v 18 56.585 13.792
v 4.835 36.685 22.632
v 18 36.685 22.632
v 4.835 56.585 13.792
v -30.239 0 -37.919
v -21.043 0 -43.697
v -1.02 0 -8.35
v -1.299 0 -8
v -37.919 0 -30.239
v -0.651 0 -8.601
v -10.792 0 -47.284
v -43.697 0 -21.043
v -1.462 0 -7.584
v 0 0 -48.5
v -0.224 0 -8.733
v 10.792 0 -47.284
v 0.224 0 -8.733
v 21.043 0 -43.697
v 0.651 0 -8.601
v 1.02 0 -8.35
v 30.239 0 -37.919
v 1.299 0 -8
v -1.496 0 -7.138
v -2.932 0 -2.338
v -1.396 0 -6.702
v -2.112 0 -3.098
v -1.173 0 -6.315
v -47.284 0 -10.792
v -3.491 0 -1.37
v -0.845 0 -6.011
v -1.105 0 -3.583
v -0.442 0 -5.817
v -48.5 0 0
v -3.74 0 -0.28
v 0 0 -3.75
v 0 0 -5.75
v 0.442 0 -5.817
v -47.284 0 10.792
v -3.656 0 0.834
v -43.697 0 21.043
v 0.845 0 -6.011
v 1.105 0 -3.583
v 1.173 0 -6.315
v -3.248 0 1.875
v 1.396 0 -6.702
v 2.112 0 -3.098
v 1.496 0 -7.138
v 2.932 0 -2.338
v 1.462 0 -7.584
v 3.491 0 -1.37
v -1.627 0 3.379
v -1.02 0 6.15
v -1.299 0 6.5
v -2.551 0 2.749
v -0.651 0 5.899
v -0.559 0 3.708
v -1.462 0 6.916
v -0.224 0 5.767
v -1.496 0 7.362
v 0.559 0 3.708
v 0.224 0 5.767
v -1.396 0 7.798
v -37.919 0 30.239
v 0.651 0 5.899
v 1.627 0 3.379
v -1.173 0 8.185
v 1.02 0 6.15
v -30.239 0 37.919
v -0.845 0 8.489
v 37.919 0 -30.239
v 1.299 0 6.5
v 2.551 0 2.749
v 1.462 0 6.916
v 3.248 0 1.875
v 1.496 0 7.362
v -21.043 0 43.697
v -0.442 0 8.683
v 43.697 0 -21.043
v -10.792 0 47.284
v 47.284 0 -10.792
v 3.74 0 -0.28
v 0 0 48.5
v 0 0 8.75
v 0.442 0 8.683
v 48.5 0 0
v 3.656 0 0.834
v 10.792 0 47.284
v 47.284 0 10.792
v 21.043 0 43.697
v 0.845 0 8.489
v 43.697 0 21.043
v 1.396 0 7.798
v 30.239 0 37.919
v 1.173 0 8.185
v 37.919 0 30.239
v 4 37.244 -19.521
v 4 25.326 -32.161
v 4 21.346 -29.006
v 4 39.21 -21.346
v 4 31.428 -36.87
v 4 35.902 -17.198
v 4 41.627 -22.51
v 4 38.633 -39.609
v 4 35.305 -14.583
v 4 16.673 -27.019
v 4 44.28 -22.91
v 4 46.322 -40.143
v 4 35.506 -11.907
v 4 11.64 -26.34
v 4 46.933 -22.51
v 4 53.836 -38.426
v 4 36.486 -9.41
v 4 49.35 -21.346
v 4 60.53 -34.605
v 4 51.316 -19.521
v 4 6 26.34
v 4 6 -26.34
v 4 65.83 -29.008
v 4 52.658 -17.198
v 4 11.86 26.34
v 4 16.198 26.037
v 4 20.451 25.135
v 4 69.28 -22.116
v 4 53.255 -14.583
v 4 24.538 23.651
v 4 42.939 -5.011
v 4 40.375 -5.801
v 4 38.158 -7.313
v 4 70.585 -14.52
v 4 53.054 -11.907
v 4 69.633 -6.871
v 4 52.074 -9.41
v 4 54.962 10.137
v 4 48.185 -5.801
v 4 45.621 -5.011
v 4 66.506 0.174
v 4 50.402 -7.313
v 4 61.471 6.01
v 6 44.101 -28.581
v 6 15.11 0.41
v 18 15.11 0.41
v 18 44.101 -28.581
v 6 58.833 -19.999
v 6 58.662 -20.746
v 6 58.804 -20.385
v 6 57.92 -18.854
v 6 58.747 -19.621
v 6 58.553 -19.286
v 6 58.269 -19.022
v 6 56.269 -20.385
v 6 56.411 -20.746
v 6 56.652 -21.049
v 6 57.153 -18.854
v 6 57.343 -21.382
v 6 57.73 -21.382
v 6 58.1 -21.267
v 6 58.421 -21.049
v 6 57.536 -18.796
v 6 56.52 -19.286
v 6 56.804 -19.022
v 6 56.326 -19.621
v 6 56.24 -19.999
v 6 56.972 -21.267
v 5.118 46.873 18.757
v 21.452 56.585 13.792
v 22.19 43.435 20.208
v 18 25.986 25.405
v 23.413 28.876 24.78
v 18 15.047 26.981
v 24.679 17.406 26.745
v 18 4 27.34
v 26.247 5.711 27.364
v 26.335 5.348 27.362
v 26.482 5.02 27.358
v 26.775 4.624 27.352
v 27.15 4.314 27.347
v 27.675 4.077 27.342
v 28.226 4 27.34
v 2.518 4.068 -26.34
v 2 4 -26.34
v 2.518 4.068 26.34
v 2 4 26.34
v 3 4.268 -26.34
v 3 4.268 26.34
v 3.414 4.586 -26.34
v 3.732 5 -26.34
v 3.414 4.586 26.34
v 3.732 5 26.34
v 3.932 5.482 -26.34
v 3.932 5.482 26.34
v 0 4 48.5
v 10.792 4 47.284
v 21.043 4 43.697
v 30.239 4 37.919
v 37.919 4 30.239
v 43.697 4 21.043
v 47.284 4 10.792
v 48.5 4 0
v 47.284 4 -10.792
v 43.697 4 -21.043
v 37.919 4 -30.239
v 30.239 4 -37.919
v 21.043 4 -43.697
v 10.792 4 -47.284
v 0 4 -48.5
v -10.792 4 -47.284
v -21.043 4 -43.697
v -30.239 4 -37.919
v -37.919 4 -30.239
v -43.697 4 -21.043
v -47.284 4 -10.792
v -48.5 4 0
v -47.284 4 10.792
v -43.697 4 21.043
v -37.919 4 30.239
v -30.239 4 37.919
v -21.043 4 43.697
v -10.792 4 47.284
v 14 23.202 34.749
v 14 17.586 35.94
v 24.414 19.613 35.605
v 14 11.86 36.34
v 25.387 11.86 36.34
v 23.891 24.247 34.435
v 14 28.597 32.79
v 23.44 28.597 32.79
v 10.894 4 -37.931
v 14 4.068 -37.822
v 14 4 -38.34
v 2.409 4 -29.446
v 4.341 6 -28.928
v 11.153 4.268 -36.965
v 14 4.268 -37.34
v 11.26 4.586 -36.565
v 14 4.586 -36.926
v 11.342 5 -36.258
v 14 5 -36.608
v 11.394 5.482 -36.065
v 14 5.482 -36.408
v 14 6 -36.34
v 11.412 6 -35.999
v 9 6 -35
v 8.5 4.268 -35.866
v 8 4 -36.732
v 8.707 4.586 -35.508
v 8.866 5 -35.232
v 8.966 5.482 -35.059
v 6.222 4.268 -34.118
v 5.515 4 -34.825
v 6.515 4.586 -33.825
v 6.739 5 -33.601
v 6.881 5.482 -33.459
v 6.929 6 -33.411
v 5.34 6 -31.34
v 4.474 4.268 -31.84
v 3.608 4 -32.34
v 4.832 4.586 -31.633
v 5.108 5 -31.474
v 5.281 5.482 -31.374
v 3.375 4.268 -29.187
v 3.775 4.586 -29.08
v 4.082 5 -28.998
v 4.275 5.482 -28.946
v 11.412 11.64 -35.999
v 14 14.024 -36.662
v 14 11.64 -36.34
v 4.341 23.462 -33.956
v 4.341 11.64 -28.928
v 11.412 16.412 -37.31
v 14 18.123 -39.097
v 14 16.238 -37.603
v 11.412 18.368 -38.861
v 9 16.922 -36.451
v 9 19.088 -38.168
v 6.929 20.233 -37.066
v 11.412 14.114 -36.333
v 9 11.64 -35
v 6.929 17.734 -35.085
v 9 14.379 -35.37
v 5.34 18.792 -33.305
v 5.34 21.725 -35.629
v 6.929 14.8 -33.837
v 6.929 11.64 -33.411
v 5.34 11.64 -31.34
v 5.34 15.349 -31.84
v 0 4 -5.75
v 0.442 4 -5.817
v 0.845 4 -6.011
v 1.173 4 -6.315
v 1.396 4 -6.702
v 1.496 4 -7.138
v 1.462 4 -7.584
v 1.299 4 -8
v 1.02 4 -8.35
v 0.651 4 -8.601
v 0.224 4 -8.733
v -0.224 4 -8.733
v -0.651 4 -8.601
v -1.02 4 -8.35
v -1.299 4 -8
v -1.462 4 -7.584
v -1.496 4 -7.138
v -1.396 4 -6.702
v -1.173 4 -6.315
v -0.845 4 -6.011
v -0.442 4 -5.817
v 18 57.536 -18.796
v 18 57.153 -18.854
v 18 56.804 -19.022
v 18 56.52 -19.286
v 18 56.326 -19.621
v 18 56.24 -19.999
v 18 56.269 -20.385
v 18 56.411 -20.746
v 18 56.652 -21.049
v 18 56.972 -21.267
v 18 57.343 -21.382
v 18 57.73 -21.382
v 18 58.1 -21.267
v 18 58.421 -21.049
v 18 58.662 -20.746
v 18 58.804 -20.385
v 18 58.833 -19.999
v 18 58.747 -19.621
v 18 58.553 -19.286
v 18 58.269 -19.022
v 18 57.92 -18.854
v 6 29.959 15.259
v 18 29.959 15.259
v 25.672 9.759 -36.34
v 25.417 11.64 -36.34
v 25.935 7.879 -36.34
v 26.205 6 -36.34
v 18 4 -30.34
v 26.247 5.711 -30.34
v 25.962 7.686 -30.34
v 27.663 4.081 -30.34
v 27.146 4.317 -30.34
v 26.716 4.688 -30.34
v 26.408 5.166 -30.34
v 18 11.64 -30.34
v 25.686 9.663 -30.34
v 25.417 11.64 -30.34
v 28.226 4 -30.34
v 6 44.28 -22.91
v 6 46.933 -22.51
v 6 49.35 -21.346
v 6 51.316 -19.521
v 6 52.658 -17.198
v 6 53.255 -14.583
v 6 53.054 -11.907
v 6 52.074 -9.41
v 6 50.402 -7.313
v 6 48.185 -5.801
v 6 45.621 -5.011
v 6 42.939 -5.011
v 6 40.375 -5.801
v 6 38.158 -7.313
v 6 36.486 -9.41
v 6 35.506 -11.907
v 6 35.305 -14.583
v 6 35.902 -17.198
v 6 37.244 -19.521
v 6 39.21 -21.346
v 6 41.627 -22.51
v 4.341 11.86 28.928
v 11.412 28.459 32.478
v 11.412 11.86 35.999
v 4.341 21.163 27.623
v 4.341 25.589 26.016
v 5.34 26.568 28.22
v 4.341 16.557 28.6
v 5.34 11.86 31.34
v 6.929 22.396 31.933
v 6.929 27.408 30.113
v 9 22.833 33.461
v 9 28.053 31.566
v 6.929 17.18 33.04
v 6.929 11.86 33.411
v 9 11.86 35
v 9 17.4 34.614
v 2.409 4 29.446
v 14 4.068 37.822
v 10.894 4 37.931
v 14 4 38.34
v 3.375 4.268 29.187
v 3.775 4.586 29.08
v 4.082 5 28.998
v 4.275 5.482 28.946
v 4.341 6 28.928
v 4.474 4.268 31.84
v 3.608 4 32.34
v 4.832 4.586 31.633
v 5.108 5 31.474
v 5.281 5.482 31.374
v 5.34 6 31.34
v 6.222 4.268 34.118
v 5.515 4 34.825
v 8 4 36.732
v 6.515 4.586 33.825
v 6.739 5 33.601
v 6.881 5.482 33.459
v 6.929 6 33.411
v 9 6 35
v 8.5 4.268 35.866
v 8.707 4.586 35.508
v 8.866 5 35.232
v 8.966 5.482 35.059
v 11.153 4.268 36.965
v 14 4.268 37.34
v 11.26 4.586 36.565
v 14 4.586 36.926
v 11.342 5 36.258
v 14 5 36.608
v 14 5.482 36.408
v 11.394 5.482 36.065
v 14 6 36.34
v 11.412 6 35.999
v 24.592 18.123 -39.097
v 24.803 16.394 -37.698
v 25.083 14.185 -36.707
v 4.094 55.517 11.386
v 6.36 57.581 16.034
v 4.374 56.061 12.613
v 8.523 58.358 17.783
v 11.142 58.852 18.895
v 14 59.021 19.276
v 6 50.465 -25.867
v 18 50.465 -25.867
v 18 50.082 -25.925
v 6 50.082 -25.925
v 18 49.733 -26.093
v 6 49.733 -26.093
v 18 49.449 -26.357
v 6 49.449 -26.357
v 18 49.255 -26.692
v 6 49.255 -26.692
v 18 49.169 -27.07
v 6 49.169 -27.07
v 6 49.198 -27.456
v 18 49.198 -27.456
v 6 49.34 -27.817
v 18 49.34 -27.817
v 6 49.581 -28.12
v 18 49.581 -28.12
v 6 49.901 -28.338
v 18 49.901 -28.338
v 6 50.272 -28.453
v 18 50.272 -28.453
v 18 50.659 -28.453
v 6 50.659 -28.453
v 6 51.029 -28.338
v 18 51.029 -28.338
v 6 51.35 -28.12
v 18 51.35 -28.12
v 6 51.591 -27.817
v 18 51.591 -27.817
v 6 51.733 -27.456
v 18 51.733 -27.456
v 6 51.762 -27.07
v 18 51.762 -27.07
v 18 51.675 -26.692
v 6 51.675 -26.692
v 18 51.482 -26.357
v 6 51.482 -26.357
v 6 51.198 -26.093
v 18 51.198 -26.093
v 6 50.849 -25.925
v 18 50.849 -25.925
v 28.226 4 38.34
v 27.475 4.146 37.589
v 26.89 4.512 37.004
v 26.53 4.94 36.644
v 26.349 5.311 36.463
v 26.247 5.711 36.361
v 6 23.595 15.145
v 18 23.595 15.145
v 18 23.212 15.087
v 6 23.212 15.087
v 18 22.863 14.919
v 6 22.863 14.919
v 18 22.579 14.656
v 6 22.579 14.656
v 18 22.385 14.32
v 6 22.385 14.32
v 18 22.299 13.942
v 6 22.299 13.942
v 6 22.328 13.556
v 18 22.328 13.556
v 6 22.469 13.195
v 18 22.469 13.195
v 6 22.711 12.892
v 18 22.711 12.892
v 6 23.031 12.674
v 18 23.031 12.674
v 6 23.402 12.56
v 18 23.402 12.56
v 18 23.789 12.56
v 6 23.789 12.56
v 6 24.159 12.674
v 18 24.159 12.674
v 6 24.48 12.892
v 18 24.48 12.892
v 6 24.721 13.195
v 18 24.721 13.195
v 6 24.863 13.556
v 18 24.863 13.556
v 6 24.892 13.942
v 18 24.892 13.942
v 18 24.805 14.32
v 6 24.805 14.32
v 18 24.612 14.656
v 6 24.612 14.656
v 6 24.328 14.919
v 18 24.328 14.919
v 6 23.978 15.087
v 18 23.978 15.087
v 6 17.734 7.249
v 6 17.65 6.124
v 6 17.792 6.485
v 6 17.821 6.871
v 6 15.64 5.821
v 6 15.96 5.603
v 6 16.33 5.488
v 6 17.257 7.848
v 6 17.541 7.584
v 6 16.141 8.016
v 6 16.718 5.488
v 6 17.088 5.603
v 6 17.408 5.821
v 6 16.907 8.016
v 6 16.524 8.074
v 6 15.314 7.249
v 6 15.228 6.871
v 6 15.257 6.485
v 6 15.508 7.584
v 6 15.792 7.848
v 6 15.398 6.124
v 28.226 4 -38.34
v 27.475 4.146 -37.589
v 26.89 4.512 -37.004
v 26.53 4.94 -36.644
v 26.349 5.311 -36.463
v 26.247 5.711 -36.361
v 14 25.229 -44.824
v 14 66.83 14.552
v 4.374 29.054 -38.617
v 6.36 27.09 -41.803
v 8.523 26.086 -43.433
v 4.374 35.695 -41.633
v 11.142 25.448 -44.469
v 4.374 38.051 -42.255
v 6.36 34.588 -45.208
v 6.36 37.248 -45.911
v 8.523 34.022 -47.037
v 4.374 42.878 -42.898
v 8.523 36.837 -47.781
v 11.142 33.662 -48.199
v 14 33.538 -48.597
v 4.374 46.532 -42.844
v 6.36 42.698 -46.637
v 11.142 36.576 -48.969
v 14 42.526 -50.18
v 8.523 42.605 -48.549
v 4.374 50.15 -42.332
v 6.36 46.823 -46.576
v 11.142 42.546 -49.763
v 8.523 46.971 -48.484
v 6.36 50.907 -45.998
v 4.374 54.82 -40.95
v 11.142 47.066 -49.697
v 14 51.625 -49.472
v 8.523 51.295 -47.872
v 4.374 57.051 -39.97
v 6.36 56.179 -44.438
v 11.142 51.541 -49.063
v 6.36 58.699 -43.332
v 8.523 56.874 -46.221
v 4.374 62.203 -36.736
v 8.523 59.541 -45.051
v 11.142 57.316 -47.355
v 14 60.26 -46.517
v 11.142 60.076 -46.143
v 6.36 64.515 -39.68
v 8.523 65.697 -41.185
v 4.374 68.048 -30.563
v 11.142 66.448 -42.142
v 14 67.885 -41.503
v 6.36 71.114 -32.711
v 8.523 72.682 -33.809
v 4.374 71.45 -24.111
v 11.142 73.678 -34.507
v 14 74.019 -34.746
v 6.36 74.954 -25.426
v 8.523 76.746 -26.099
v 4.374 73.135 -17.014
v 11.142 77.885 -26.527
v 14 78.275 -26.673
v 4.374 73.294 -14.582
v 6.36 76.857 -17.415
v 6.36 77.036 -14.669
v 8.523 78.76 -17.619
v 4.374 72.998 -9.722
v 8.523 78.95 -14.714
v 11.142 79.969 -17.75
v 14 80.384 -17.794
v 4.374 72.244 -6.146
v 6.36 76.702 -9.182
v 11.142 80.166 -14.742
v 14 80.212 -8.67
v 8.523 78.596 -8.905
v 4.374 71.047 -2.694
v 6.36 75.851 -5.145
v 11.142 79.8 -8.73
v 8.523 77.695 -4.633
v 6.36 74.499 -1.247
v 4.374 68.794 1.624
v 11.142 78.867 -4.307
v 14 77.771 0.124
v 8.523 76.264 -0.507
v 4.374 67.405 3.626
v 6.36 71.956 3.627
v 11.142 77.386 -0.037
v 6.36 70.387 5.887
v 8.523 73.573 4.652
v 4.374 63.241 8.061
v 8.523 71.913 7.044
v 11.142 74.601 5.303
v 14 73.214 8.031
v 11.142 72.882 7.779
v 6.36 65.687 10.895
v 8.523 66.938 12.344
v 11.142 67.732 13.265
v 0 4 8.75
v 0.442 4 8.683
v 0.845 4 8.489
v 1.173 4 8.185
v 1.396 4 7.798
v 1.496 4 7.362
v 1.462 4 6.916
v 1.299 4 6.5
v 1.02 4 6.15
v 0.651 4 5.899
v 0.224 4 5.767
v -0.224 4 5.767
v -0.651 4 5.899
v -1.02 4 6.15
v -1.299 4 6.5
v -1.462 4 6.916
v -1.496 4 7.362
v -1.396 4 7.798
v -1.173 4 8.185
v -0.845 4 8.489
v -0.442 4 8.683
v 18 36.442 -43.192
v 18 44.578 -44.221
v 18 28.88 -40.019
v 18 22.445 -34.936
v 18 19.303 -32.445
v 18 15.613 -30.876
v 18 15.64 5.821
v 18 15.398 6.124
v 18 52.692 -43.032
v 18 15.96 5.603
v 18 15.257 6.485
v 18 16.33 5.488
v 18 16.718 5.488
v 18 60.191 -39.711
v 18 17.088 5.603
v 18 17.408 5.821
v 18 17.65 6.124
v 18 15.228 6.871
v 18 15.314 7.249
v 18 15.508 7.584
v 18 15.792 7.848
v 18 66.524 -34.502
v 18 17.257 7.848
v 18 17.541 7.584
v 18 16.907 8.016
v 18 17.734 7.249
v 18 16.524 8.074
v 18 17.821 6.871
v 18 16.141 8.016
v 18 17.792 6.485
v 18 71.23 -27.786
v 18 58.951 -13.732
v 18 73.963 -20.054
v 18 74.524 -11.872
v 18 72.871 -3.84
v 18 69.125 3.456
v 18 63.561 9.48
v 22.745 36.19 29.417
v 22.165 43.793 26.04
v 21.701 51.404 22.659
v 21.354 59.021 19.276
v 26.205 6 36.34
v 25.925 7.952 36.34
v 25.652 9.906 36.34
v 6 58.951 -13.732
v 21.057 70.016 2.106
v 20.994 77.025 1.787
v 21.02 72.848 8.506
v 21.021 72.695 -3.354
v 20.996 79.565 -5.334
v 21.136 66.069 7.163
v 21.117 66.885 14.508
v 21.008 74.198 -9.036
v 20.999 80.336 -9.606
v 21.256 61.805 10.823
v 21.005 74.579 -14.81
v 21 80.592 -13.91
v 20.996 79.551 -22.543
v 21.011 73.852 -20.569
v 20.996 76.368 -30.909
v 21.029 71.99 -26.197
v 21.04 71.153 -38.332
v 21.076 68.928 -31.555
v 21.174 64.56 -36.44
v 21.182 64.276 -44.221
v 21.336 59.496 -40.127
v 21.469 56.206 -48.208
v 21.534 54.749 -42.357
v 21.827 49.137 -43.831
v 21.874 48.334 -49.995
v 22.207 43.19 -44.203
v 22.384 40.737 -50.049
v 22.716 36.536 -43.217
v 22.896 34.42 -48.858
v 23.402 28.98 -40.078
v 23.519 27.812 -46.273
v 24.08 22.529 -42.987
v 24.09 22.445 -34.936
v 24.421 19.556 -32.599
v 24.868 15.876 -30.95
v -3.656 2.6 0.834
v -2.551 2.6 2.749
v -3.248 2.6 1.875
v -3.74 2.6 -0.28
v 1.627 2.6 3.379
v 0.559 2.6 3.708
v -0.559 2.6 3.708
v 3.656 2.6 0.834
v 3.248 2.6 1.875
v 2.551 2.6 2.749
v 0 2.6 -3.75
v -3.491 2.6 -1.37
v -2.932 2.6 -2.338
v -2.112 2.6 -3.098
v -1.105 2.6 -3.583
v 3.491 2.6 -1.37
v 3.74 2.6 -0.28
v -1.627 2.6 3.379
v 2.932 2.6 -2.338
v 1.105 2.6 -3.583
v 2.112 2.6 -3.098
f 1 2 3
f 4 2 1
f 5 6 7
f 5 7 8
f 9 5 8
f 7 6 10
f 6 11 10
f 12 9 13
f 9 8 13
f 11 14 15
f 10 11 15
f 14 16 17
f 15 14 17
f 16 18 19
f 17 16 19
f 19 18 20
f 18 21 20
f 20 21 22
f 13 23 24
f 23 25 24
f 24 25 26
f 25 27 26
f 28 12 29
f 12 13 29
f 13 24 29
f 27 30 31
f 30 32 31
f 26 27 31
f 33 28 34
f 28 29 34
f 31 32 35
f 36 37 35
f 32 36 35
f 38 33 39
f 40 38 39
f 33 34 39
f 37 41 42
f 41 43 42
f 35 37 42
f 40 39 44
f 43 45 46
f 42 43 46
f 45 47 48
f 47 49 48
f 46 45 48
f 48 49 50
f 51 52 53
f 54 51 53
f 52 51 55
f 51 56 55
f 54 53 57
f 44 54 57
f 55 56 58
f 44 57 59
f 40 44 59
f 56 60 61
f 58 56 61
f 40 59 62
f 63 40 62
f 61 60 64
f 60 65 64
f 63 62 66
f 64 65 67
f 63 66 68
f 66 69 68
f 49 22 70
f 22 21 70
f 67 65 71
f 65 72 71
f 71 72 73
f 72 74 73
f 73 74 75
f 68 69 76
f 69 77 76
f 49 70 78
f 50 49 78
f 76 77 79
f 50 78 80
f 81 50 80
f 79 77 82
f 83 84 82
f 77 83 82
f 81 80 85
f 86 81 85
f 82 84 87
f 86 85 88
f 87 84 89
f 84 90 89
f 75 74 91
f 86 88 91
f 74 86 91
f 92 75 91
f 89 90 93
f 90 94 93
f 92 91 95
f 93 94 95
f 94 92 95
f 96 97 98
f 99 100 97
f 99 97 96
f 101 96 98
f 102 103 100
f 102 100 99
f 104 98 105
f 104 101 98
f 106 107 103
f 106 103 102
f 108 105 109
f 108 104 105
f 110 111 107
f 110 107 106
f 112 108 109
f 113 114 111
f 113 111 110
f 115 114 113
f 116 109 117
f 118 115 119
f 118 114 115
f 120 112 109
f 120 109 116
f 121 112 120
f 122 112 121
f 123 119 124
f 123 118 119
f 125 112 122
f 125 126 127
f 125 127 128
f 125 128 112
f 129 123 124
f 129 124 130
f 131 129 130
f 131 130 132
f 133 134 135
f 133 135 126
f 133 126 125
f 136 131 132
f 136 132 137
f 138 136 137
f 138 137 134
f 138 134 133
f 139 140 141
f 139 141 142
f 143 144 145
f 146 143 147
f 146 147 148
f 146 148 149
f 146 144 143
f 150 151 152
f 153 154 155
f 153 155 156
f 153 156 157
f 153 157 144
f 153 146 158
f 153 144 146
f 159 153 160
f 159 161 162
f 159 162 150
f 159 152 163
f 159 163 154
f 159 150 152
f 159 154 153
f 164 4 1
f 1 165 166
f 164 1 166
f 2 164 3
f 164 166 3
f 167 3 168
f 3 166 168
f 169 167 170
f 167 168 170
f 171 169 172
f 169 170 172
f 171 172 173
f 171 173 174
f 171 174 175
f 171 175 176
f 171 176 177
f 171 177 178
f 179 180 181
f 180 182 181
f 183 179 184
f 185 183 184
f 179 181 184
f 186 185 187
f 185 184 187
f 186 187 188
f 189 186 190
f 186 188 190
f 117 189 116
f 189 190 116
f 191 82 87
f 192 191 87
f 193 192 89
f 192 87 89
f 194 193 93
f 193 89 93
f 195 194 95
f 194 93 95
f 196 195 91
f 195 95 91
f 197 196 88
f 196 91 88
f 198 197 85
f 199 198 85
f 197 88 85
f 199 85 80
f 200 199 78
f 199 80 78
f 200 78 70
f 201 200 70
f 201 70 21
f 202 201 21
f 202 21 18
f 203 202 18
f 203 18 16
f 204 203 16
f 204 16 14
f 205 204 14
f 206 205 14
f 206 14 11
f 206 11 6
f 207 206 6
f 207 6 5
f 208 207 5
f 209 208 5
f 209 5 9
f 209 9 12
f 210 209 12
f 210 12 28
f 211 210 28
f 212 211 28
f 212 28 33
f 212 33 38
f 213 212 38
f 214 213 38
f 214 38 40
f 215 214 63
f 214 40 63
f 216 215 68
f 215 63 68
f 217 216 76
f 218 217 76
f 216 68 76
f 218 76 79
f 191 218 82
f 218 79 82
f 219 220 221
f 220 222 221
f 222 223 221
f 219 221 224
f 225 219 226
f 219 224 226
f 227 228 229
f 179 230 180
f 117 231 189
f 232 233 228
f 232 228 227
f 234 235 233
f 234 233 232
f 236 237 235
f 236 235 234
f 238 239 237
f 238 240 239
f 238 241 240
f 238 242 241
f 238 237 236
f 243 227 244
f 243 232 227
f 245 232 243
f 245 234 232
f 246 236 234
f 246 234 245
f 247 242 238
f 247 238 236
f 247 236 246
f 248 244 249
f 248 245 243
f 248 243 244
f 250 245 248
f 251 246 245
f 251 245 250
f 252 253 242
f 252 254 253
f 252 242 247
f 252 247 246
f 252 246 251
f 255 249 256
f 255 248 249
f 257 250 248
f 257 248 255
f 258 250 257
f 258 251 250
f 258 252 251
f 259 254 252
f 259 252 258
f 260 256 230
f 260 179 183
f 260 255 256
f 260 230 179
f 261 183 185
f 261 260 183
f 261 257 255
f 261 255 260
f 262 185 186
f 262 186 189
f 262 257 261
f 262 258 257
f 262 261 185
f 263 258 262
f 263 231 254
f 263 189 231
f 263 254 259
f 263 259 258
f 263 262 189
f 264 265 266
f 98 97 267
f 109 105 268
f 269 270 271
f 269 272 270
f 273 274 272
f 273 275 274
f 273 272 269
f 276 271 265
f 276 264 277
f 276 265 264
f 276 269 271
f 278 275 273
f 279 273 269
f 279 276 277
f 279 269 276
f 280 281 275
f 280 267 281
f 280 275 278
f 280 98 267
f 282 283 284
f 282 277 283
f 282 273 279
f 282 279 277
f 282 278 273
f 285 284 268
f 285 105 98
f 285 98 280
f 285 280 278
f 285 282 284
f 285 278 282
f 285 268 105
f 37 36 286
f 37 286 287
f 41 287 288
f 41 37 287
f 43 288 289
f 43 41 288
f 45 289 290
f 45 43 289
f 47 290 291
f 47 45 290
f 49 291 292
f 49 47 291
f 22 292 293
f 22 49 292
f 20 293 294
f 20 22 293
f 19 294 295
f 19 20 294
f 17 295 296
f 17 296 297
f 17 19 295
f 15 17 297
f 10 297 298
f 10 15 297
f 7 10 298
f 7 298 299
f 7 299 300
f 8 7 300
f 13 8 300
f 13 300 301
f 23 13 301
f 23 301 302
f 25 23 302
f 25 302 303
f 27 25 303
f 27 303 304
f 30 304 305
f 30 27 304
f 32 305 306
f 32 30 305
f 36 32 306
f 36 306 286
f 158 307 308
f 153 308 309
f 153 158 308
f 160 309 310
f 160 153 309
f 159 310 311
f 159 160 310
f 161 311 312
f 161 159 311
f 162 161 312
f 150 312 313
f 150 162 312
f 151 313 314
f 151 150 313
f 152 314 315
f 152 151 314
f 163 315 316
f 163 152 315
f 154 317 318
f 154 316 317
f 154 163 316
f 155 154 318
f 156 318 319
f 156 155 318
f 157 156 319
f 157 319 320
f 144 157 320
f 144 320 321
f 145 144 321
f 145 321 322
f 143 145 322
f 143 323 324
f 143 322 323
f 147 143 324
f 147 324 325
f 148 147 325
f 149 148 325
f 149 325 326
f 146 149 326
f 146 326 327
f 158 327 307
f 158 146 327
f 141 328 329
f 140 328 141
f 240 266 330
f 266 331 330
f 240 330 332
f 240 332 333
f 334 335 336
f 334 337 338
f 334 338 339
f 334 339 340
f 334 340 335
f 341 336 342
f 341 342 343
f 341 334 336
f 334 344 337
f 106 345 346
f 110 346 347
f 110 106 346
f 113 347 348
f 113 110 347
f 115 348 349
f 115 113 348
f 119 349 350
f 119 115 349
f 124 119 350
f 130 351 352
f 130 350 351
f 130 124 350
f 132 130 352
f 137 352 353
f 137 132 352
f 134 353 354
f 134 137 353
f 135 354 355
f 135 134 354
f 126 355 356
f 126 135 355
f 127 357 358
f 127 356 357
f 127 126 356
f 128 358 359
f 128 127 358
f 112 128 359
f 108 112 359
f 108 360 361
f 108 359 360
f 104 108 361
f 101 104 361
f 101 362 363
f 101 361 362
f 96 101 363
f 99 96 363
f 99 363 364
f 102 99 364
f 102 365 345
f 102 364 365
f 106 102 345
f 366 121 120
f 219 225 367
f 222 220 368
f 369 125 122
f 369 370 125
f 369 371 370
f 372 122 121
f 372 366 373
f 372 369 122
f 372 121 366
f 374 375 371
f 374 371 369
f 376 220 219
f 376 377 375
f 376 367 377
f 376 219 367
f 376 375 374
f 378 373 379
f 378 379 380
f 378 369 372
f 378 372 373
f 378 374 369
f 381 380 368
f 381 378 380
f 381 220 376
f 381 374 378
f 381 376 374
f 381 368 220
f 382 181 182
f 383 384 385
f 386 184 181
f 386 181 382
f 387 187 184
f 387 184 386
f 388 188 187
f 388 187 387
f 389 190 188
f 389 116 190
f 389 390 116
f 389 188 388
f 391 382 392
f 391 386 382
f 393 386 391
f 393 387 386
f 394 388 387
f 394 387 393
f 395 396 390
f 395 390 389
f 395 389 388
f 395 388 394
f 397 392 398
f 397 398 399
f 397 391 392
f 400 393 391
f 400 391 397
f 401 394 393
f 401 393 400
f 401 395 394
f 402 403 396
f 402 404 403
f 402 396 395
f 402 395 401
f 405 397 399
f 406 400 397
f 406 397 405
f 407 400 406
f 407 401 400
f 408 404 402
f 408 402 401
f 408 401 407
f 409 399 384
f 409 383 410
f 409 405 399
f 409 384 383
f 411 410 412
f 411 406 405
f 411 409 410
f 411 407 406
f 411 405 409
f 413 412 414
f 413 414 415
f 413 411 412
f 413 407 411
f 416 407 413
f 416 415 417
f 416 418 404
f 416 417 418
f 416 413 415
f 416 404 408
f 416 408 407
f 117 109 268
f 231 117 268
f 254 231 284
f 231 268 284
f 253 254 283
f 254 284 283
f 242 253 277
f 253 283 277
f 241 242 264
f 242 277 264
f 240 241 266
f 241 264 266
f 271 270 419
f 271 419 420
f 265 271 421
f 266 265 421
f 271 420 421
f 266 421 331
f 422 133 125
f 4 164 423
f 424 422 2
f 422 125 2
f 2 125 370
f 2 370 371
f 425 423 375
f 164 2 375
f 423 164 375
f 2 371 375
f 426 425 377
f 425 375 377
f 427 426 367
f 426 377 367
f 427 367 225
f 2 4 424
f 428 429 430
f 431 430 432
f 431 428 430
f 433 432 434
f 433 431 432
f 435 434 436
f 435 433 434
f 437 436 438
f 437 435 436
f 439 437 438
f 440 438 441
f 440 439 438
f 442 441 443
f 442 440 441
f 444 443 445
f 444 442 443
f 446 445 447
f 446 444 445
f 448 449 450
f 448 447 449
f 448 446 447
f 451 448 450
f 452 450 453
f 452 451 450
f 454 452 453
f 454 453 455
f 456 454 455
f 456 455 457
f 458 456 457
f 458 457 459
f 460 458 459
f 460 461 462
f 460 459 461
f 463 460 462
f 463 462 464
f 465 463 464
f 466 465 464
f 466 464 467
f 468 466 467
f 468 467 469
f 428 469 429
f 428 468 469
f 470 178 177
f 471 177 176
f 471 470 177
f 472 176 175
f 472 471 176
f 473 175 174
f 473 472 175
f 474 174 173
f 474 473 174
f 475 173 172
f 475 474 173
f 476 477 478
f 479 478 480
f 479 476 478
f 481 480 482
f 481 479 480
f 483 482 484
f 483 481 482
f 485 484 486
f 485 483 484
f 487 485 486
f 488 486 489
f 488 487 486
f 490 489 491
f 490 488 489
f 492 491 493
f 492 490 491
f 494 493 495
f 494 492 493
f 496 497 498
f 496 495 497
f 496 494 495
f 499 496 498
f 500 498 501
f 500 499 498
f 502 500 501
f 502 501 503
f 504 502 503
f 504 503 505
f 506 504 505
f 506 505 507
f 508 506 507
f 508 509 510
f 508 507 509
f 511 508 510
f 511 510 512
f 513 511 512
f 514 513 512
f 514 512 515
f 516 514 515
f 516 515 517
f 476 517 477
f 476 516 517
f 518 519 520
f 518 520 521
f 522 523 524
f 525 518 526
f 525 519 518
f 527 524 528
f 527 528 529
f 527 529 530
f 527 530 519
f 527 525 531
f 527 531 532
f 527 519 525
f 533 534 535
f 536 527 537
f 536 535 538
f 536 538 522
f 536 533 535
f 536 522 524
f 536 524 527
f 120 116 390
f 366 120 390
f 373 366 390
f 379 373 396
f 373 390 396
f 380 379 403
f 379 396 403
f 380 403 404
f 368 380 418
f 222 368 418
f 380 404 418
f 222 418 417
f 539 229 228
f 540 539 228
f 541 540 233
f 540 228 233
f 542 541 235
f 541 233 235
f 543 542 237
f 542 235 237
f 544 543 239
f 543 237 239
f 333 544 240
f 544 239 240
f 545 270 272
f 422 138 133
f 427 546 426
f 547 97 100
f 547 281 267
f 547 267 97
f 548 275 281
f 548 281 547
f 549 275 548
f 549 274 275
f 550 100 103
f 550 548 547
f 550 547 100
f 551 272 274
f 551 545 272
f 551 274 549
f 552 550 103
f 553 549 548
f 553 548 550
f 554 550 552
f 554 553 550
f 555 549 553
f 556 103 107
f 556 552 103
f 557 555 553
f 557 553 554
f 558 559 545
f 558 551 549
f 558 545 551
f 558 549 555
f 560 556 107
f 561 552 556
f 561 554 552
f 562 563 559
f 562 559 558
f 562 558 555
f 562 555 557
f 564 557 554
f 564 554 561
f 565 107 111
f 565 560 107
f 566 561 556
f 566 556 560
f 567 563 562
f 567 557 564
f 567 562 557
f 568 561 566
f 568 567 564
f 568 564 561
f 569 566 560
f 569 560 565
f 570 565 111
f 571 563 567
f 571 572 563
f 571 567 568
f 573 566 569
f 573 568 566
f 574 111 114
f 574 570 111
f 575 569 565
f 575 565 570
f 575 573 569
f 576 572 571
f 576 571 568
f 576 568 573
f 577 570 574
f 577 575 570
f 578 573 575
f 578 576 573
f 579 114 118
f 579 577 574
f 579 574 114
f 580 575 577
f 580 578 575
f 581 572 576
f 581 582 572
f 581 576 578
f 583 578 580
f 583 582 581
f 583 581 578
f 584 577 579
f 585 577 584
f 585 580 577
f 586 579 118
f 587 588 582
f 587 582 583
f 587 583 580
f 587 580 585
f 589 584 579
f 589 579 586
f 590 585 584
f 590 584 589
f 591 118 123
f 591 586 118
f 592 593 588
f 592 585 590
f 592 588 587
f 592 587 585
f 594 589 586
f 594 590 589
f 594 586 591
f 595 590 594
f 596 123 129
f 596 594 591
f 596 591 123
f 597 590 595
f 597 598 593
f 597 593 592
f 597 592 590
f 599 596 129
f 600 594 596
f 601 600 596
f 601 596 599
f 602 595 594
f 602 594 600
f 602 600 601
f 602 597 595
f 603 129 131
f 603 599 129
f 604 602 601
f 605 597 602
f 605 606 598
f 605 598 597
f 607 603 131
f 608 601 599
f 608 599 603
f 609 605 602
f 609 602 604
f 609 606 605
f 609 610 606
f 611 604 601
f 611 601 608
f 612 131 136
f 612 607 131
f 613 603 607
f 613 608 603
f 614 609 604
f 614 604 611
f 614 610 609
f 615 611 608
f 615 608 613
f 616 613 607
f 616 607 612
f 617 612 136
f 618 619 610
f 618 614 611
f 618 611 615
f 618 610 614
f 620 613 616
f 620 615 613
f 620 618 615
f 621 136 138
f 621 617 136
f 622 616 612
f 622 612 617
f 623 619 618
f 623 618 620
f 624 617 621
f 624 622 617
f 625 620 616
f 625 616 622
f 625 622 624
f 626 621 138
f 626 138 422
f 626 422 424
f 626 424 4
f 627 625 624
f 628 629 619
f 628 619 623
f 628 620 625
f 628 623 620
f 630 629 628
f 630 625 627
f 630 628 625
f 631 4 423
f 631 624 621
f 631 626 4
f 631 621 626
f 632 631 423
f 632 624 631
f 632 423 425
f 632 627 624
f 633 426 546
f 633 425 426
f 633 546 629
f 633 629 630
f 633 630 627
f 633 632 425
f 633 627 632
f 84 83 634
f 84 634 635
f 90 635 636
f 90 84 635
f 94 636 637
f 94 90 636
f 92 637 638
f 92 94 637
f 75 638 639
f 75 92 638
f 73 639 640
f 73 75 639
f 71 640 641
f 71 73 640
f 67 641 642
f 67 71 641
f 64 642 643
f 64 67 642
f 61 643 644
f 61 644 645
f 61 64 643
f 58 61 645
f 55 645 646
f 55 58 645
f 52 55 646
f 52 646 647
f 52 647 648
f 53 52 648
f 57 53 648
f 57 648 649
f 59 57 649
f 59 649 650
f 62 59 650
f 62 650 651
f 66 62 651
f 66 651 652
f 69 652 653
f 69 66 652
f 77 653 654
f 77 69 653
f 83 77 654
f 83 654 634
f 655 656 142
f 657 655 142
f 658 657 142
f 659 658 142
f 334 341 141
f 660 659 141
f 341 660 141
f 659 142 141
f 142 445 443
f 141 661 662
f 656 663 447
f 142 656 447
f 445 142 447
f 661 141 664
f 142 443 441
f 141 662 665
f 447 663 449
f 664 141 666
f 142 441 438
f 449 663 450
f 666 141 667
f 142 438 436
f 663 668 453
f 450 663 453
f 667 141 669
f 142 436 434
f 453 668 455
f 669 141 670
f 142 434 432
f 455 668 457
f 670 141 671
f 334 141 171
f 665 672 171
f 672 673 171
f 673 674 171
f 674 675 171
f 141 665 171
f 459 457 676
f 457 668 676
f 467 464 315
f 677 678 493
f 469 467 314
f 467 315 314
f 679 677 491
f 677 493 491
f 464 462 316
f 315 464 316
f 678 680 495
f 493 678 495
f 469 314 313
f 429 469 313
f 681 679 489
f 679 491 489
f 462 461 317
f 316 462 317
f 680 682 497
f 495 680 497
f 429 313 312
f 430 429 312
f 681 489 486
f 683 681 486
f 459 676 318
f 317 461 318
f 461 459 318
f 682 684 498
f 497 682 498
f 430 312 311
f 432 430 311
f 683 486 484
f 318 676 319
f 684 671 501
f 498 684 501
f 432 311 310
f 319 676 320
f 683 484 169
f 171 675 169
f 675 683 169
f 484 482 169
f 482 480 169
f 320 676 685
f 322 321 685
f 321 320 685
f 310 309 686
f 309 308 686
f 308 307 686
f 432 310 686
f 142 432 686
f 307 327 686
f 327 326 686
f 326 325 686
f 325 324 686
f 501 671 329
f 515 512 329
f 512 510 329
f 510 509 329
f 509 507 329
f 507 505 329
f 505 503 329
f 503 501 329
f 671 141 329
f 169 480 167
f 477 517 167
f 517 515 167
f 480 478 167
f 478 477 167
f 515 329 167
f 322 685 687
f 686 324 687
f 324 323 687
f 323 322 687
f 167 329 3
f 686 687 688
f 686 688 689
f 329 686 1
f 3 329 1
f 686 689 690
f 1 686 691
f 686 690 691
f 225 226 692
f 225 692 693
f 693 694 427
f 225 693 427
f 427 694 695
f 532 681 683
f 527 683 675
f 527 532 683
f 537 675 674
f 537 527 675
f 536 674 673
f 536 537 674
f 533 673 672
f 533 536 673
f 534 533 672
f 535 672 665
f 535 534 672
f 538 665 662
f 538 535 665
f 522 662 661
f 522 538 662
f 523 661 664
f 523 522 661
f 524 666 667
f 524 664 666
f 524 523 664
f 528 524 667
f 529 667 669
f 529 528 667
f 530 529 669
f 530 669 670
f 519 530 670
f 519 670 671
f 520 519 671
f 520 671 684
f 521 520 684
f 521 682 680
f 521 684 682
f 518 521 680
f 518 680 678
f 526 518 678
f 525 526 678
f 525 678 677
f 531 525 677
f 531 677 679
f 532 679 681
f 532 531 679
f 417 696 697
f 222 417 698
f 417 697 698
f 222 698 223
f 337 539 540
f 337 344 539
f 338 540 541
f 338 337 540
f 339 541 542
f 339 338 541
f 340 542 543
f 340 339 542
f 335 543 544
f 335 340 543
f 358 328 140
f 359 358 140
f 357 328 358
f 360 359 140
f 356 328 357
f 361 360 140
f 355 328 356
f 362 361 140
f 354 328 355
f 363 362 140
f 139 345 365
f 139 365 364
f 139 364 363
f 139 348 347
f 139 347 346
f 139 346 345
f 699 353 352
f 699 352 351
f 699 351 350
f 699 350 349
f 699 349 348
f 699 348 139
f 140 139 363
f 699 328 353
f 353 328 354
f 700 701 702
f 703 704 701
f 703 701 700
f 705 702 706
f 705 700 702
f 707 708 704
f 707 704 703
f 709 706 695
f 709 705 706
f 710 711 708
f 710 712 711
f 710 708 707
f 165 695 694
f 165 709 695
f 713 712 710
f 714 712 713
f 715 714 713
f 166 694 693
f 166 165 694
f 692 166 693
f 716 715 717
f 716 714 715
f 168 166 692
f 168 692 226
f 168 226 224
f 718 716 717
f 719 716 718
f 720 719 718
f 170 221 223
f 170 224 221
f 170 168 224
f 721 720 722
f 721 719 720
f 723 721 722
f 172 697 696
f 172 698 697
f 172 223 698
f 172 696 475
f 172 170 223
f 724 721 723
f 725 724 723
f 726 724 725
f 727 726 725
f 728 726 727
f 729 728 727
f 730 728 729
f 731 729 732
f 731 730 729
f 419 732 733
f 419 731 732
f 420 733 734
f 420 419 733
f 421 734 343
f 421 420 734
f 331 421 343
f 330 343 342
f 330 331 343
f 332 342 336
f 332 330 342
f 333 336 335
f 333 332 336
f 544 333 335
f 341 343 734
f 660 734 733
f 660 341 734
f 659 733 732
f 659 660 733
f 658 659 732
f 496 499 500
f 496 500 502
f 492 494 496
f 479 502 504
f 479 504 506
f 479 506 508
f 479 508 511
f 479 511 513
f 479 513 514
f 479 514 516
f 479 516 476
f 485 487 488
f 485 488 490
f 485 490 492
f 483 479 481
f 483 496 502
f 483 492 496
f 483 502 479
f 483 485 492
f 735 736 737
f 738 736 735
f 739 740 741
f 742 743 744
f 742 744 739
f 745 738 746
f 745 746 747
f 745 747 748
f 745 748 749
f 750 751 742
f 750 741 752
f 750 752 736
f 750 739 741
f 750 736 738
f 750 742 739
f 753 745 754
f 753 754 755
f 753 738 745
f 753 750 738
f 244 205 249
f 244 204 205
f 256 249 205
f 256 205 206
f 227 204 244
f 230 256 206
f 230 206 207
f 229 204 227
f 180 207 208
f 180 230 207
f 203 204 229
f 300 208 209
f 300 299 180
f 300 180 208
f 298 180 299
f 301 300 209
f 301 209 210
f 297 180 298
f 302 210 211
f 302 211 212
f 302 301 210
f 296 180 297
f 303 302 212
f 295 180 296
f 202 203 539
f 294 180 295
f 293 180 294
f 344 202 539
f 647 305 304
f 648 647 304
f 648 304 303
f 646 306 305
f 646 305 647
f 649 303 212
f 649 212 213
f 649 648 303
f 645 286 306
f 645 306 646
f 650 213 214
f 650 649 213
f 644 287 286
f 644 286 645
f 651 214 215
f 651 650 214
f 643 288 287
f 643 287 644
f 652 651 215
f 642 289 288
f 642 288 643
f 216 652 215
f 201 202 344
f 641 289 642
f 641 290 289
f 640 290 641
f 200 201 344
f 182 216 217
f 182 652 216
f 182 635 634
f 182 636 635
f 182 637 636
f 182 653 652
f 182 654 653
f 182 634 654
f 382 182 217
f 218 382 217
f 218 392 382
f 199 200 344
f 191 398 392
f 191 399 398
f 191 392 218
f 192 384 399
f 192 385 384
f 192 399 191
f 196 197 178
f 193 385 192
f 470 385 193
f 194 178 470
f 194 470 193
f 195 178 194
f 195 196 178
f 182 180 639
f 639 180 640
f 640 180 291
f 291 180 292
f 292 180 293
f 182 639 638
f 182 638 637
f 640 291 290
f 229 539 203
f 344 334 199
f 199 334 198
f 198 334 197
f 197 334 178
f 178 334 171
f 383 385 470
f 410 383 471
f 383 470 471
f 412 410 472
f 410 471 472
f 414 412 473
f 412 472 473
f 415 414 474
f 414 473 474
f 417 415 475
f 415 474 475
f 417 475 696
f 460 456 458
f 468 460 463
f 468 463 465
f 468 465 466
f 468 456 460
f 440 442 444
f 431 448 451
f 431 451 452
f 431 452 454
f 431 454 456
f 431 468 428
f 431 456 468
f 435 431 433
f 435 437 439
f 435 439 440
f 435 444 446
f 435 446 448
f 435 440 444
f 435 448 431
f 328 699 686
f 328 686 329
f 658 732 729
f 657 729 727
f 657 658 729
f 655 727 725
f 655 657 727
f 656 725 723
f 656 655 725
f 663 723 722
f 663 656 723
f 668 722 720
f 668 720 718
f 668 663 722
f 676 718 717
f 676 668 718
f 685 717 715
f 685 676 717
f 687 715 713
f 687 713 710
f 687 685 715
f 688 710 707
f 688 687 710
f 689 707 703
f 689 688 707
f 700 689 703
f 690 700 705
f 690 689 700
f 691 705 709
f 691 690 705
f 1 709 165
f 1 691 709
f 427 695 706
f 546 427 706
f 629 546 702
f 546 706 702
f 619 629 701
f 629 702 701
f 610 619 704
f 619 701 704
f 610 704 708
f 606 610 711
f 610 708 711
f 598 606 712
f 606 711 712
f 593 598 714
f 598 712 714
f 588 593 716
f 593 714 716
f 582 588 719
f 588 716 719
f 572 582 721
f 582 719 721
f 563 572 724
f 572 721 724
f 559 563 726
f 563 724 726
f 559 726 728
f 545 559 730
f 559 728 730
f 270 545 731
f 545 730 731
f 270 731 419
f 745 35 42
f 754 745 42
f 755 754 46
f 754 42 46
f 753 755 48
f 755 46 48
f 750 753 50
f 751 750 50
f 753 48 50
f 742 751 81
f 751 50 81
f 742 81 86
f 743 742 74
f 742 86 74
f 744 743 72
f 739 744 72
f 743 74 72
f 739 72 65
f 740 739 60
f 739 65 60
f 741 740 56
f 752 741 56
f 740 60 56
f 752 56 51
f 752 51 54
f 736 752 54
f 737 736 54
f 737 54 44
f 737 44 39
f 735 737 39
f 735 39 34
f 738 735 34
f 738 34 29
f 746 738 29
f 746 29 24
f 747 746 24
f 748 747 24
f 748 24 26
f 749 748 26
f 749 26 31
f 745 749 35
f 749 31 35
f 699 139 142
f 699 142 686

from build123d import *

# Parameters (mm, degrees)
SKETCH1_R                       = 48.5
SKETCH1_R_2                     = 1.5
BOSS_EXTRUDE3_DEPTH             = 4
BOSS_EXTRUDE4_START             = 4
SKETCH3_R                       = 9
BOSS_EXTRUDE4_DEPTH             = 14
CUT_EXTRUDE2_START              = 6
SKETCH5_R                       = 1.3
CUT_EXTRUDE2_DEPTH              = 96.333743786
BOSS_EXTRUDE5_DEPTH             = 9
BOSS_EXTRUDE5_DIRECTION_2_REACH = 113.079
CUT_EXTRUDE3_DEPTH              = 107.628687584
CUT_EXTRUDE3_DEPTH_BACK         = 107.628687584
FILLET1_R                       = 10
FILLET2_R                       = 2
SKETCH11_R                      = 3.75
CUT_EXTRUDE4_DEPTH              = 2.6


with BuildPart() as part:
    # Sketch1 → Boss-Extrude3 (new body)
    with BuildSketch(Plane(origin=(0, 0, 0), x_dir=(1, 0, 0), z_dir=(0, 1, 0))):
        with Locations(Location((0, 0, 0), (0, 0, 270))):
            Circle(SKETCH1_R)
        with Locations(Location((0, 7.25, 0), (0, 0, 270))):
            Circle(SKETCH1_R_2, mode=Mode.SUBTRACT)
        with Locations(Location((0, -7.25, 0), (0, 0, 270))):
            Circle(SKETCH1_R_2, mode=Mode.SUBTRACT)
    extrude(amount=BOSS_EXTRUDE3_DEPTH)

    # Sketch3 → Boss-Extrude4 (add)
    with BuildSketch(Plane(origin=(0, 0, 0), x_dir=(0, 0, -1), z_dir=(1, 0, 0)).offset(BOSS_EXTRUDE4_START)):
        with BuildLine():
            Line((30.34, 4), (-30.34, 4))
            Line((-30.34, 4), (-30.34, 11.86))
            ThreePointArc((-30.34, 11.86), (-29.573286886, 19.169908139), (-27.306519614, 26.161644128))
            Line((-27.306519614, 26.161644128), (-13.792358873, 56.58534489))
            ThreePointArc((-13.792358873, 56.58534489), (31.303559207, 69.105517077), (34.935565542, 22.444986978))
            ThreePointArc((34.935565542, 22.444986978), (31.536621485, 17.510838233), (30.34, 11.64))
            Line((30.34, 11.64), (30.34, 4))
        make_face()
        with Locations((13.91, 44.28)):
            Circle(SKETCH3_R, mode=Mode.SUBTRACT)
    extrude(amount=BOSS_EXTRUDE4_DEPTH)

    # Sketch5 → Cut-Extrude2 (cut, through all)
    with BuildSketch(Plane(origin=(0, 0, 0), x_dir=(0, 0, -1), z_dir=(1, 0, 0)).offset(CUT_EXTRUDE2_START)):
        with Locations(Location((27.167164466, 50.465339059, 0), (0, 0, 180))):
            Circle(SKETCH5_R)
        with Locations(Location((20.096096654, 57.536406871, 0), (0, 0, 180))):
            Circle(SKETCH5_R)
        with Locations(Location((-6.773961031, 16.524213562, 0), (0, 0, 180))):
            Circle(SKETCH5_R)
        with Locations(Location((-13.845028843, 23.595281374, 0), (0, 0, 180))):
            Circle(SKETCH5_R)
        Polygon((-0.41, 15.11), (28.581378029, 44.101378029), (13.732135624, 58.950620434), (-15.259242405, 29.959242405), align=None)
    extrude(amount=CUT_EXTRUDE2_DEPTH, mode=Mode.SUBTRACT)

    # Sketch9 → Boss-Extrude5 (add)
    with BuildSketch(Plane(origin=(18, 0, 0), x_dir=(0, 0, -1), z_dir=(1, 0, 0))):
        with BuildLine():
            Line((30.34, 4), (30.34, 11.64))
            ThreePointArc((30.34, 11.64), (31.536621485, 17.510838233), (34.935565542, 22.444986978))
            ThreePointArc((34.935565542, 22.444986978), (31.303559207, 69.105517077), (-13.792358873, 56.58534489))
            ThreePointArc((-13.792358873, 56.58534489), (-24.20389685, 31.229863028), (-27.34, 4))
            Line((-27.34, 4), (-36.34, 4))
            Line((-36.34, 4), (-36.34, 11.86))
            ThreePointArc((-36.34, 11.86), (-35.442708439, 20.414854175), (-32.789889403, 28.597348492))
            Line((-32.789889403, 28.597348492), (-19.275728663, 59.021049255))
            ThreePointArc((-19.275728663, 59.021049255), (34.746418262, 74.019448449), (39.097339325, 18.122992187))
            ThreePointArc((39.097339325, 18.122992187), (37.057972891, 15.16250294), (36.34, 11.64))
            Line((36.34, 11.64), (36.34, 4))
            Line((36.34, 4), (30.34, 4))
        make_face()
    extrude(amount=BOSS_EXTRUDE5_DEPTH)

    # Boss-Extrude5 direction 2: up to this face of the body (flat: up to its plane)
    boss_extrude5_direction_2_end = Plane(part.part.faces().sort_by_distance((4, 35.761181815, -7.797700276))[0])
    # Sketch9 → Boss-Extrude5 direction 2 (add, up to the picked face)
    with BuildSketch(Plane(origin=(18, 0, 0), x_dir=(0, 0, -1), z_dir=(1, 0, 0)), mode=Mode.PRIVATE) as boss_extrude5_direction_2_sk1:
        with BuildLine():
            Line((30.34, 4), (30.34, 11.64))
            ThreePointArc((30.34, 11.64), (31.536621485, 17.510838233), (34.935565542, 22.444986978))
            ThreePointArc((34.935565542, 22.444986978), (31.303559207, 69.105517077), (-13.792358873, 56.58534489))
            ThreePointArc((-13.792358873, 56.58534489), (-24.20389685, 31.229863028), (-27.34, 4))
            Line((-27.34, 4), (-36.34, 4))
            Line((-36.34, 4), (-36.34, 11.86))
            ThreePointArc((-36.34, 11.86), (-35.442708439, 20.414854175), (-32.789889403, 28.597348492))
            Line((-32.789889403, 28.597348492), (-19.275728663, 59.021049255))
            ThreePointArc((-19.275728663, 59.021049255), (34.746418262, 74.019448449), (39.097339325, 18.122992187))
            ThreePointArc((39.097339325, 18.122992187), (37.057972891, 15.16250294), (36.34, 11.64))
            Line((36.34, 11.64), (36.34, 4))
            Line((36.34, 4), (30.34, 4))
        make_face()
    boss_extrude5_direction_2_tool1 = split(extrude(boss_extrude5_direction_2_sk1.sketch, amount=-BOSS_EXTRUDE5_DIRECTION_2_REACH, mode=Mode.PRIVATE), bisect_by=boss_extrude5_direction_2_end, keep=Keep.BOTH, mode=Mode.PRIVATE)
    add(boss_extrude5_direction_2_tool1.solids().sort_by(Axis((18, 43.339989, 24.976501), (-1, 0, 0)))[0])

    # Sketch10 → Cut-Extrude3 (cut, two sides: drawn at the far end of the back side and taken through both)
    with BuildSketch(Plane.XY.offset(-CUT_EXTRUDE3_DEPTH_BACK)):
        with BuildLine():
            Line((27, 80.59241), (21, 80.59241))
            ThreePointArc((21, 80.59241), (22.277450308, 42.190463148), (26.5, 4))
            Line((26.5, 4), (27, 4))
            Line((27, 4), (27, 80.59241))
        make_face()
    extrude(amount=CUT_EXTRUDE3_DEPTH + CUT_EXTRUDE3_DEPTH_BACK, mode=Mode.SUBTRACT)

    # Fillet1
    # the kernel refuses this fillet: 10 mm, written as the material it takes off along each edge
    with BuildSketch(Plane(origin=(4, 11.64, -36.34), x_dir=(0, 0, 1), z_dir=(0, -1, 0))) as fillet1_piece_1:
        with BuildLine():
            CenterArc((FILLET1_R, -FILLET1_R), FILLET1_R, 90, 90)
            Line((0, -FILLET1_R), (0, 0))
            Line((0, 0), (FILLET1_R, 0))
        make_face()
    extrude(amount=7.64, mode=Mode.SUBTRACT)
    with BuildSketch(Plane(origin=(4, 11.64, -45.34), x_dir=(0, 0.7203324652134895, 0.6936289638988969), z_dir=(0, 0.6936289638988969, -0.7203324652134895))) as fillet1_piece_2:
        with BuildLine():
            CenterArc((9 + FILLET1_R, FILLET1_R), FILLET1_R, 180, 90)
            Line((9, FILLET1_R), (9, 0))
            Line((9, 0), (9 + FILLET1_R, 0))
        make_face()
    revolve(axis=Axis((4, 11.64, -45.34), (1, 0, 0)), revolution_arc=46.081936205, mode=Mode.SUBTRACT)
    with BuildSketch(Plane(origin=(4, 44.28, -13.91), x_dir=(0, -0.7203324652134897, -0.6936289638988965), z_dir=(0, -0.6936289638988965, 0.7203324652134897))) as fillet1_piece_3:
        with BuildLine():
            CenterArc((36.31241 - FILLET1_R, FILLET1_R), FILLET1_R, 270, 90)
            Line((36.31241, FILLET1_R), (36.31241, 0))
            Line((36.31241, 0), (36.31241 - FILLET1_R, 0))
        make_face()
    revolve(axis=Axis((4, 44.28, -13.91), (1, 0, 0)), revolution_arc=202.131217863, mode=Mode.SUBTRACT)
    with BuildSketch(Plane(origin=(4, 28.597348492, 32.789889403), x_dir=(0, -0.40595072743967076, -0.913894964911834), z_dir=(0, 0.913894964911834, -0.4059507274396708))) as fillet1_piece_4:
        with BuildLine():
            CenterArc((FILLET1_R, -FILLET1_R), FILLET1_R, 90, 90)
            Line((0, -FILLET1_R), (0, 0))
            Line((0, 0), (FILLET1_R, 0))
        make_face()
    extrude(amount=33.290150324, mode=Mode.SUBTRACT)
    with BuildSketch(Plane(origin=(4, 11.86, -4.89), x_dir=(0, 0.4059507274396698, 0.9138949649118343), z_dir=(0, 0.9138949649118343, -0.4059507274396698))) as fillet1_piece_5:
        with BuildLine():
            CenterArc((41.23 - FILLET1_R, FILLET1_R), FILLET1_R, 270, 90)
            Line((41.23, FILLET1_R), (41.23, 0))
            Line((41.23, 0), (41.23 - FILLET1_R, 0))
        make_face()
    revolve(axis=Axis((4, 11.86, -4.89), (1, 0, 0)), revolution_arc=23.950718343, mode=Mode.SUBTRACT)
    with BuildSketch(Plane(origin=(4, 4, 36.34), x_dir=(0, 0, -1), z_dir=(0, 1, 0))) as fillet1_piece_6:
        with BuildLine():
            CenterArc((FILLET1_R, -FILLET1_R), FILLET1_R, 90, 90)
            Line((0, -FILLET1_R), (0, 0))
            Line((0, 0), (FILLET1_R, 0))
        make_face()
    extrude(amount=7.86, mode=Mode.SUBTRACT)

    # Fillet2
    fillet2_edges = [part.edges().sort_by_distance(p)[0] for p in [
        (20.25, 4, -36.34),
        (20.25, 4, 36.34),
        (6.928932188, 4, 33.411067812),
        (4, 4, 0),
        (6.928932188, 4, -33.411067812),
    ]]
    fillet(fillet2_edges, radius=FILLET2_R)
    fillet2_2_edges = [part.edges().sort_by_distance(p)[0] for p in [
        (26.5, 4, -33.34),
    ]]
    fillet(fillet2_2_edges, radius=FILLET2_R)
    fillet2_3_edges = [part.edges().sort_by_distance(p)[0] for p in [
        (26.5, 4, 31.84),
    ]]
    fillet(fillet2_3_edges, radius=FILLET2_R)

    # Sketch11 → Cut-Extrude4 (cut)
    with BuildSketch(Plane.XZ):
        with Locations(Location((0, 0, 0), (0, 0, 270))):
            Circle(SKETCH11_R)
    extrude(amount=-CUT_EXTRUDE4_DEPTH, mode=Mode.SUBTRACT)


solid = part.part
